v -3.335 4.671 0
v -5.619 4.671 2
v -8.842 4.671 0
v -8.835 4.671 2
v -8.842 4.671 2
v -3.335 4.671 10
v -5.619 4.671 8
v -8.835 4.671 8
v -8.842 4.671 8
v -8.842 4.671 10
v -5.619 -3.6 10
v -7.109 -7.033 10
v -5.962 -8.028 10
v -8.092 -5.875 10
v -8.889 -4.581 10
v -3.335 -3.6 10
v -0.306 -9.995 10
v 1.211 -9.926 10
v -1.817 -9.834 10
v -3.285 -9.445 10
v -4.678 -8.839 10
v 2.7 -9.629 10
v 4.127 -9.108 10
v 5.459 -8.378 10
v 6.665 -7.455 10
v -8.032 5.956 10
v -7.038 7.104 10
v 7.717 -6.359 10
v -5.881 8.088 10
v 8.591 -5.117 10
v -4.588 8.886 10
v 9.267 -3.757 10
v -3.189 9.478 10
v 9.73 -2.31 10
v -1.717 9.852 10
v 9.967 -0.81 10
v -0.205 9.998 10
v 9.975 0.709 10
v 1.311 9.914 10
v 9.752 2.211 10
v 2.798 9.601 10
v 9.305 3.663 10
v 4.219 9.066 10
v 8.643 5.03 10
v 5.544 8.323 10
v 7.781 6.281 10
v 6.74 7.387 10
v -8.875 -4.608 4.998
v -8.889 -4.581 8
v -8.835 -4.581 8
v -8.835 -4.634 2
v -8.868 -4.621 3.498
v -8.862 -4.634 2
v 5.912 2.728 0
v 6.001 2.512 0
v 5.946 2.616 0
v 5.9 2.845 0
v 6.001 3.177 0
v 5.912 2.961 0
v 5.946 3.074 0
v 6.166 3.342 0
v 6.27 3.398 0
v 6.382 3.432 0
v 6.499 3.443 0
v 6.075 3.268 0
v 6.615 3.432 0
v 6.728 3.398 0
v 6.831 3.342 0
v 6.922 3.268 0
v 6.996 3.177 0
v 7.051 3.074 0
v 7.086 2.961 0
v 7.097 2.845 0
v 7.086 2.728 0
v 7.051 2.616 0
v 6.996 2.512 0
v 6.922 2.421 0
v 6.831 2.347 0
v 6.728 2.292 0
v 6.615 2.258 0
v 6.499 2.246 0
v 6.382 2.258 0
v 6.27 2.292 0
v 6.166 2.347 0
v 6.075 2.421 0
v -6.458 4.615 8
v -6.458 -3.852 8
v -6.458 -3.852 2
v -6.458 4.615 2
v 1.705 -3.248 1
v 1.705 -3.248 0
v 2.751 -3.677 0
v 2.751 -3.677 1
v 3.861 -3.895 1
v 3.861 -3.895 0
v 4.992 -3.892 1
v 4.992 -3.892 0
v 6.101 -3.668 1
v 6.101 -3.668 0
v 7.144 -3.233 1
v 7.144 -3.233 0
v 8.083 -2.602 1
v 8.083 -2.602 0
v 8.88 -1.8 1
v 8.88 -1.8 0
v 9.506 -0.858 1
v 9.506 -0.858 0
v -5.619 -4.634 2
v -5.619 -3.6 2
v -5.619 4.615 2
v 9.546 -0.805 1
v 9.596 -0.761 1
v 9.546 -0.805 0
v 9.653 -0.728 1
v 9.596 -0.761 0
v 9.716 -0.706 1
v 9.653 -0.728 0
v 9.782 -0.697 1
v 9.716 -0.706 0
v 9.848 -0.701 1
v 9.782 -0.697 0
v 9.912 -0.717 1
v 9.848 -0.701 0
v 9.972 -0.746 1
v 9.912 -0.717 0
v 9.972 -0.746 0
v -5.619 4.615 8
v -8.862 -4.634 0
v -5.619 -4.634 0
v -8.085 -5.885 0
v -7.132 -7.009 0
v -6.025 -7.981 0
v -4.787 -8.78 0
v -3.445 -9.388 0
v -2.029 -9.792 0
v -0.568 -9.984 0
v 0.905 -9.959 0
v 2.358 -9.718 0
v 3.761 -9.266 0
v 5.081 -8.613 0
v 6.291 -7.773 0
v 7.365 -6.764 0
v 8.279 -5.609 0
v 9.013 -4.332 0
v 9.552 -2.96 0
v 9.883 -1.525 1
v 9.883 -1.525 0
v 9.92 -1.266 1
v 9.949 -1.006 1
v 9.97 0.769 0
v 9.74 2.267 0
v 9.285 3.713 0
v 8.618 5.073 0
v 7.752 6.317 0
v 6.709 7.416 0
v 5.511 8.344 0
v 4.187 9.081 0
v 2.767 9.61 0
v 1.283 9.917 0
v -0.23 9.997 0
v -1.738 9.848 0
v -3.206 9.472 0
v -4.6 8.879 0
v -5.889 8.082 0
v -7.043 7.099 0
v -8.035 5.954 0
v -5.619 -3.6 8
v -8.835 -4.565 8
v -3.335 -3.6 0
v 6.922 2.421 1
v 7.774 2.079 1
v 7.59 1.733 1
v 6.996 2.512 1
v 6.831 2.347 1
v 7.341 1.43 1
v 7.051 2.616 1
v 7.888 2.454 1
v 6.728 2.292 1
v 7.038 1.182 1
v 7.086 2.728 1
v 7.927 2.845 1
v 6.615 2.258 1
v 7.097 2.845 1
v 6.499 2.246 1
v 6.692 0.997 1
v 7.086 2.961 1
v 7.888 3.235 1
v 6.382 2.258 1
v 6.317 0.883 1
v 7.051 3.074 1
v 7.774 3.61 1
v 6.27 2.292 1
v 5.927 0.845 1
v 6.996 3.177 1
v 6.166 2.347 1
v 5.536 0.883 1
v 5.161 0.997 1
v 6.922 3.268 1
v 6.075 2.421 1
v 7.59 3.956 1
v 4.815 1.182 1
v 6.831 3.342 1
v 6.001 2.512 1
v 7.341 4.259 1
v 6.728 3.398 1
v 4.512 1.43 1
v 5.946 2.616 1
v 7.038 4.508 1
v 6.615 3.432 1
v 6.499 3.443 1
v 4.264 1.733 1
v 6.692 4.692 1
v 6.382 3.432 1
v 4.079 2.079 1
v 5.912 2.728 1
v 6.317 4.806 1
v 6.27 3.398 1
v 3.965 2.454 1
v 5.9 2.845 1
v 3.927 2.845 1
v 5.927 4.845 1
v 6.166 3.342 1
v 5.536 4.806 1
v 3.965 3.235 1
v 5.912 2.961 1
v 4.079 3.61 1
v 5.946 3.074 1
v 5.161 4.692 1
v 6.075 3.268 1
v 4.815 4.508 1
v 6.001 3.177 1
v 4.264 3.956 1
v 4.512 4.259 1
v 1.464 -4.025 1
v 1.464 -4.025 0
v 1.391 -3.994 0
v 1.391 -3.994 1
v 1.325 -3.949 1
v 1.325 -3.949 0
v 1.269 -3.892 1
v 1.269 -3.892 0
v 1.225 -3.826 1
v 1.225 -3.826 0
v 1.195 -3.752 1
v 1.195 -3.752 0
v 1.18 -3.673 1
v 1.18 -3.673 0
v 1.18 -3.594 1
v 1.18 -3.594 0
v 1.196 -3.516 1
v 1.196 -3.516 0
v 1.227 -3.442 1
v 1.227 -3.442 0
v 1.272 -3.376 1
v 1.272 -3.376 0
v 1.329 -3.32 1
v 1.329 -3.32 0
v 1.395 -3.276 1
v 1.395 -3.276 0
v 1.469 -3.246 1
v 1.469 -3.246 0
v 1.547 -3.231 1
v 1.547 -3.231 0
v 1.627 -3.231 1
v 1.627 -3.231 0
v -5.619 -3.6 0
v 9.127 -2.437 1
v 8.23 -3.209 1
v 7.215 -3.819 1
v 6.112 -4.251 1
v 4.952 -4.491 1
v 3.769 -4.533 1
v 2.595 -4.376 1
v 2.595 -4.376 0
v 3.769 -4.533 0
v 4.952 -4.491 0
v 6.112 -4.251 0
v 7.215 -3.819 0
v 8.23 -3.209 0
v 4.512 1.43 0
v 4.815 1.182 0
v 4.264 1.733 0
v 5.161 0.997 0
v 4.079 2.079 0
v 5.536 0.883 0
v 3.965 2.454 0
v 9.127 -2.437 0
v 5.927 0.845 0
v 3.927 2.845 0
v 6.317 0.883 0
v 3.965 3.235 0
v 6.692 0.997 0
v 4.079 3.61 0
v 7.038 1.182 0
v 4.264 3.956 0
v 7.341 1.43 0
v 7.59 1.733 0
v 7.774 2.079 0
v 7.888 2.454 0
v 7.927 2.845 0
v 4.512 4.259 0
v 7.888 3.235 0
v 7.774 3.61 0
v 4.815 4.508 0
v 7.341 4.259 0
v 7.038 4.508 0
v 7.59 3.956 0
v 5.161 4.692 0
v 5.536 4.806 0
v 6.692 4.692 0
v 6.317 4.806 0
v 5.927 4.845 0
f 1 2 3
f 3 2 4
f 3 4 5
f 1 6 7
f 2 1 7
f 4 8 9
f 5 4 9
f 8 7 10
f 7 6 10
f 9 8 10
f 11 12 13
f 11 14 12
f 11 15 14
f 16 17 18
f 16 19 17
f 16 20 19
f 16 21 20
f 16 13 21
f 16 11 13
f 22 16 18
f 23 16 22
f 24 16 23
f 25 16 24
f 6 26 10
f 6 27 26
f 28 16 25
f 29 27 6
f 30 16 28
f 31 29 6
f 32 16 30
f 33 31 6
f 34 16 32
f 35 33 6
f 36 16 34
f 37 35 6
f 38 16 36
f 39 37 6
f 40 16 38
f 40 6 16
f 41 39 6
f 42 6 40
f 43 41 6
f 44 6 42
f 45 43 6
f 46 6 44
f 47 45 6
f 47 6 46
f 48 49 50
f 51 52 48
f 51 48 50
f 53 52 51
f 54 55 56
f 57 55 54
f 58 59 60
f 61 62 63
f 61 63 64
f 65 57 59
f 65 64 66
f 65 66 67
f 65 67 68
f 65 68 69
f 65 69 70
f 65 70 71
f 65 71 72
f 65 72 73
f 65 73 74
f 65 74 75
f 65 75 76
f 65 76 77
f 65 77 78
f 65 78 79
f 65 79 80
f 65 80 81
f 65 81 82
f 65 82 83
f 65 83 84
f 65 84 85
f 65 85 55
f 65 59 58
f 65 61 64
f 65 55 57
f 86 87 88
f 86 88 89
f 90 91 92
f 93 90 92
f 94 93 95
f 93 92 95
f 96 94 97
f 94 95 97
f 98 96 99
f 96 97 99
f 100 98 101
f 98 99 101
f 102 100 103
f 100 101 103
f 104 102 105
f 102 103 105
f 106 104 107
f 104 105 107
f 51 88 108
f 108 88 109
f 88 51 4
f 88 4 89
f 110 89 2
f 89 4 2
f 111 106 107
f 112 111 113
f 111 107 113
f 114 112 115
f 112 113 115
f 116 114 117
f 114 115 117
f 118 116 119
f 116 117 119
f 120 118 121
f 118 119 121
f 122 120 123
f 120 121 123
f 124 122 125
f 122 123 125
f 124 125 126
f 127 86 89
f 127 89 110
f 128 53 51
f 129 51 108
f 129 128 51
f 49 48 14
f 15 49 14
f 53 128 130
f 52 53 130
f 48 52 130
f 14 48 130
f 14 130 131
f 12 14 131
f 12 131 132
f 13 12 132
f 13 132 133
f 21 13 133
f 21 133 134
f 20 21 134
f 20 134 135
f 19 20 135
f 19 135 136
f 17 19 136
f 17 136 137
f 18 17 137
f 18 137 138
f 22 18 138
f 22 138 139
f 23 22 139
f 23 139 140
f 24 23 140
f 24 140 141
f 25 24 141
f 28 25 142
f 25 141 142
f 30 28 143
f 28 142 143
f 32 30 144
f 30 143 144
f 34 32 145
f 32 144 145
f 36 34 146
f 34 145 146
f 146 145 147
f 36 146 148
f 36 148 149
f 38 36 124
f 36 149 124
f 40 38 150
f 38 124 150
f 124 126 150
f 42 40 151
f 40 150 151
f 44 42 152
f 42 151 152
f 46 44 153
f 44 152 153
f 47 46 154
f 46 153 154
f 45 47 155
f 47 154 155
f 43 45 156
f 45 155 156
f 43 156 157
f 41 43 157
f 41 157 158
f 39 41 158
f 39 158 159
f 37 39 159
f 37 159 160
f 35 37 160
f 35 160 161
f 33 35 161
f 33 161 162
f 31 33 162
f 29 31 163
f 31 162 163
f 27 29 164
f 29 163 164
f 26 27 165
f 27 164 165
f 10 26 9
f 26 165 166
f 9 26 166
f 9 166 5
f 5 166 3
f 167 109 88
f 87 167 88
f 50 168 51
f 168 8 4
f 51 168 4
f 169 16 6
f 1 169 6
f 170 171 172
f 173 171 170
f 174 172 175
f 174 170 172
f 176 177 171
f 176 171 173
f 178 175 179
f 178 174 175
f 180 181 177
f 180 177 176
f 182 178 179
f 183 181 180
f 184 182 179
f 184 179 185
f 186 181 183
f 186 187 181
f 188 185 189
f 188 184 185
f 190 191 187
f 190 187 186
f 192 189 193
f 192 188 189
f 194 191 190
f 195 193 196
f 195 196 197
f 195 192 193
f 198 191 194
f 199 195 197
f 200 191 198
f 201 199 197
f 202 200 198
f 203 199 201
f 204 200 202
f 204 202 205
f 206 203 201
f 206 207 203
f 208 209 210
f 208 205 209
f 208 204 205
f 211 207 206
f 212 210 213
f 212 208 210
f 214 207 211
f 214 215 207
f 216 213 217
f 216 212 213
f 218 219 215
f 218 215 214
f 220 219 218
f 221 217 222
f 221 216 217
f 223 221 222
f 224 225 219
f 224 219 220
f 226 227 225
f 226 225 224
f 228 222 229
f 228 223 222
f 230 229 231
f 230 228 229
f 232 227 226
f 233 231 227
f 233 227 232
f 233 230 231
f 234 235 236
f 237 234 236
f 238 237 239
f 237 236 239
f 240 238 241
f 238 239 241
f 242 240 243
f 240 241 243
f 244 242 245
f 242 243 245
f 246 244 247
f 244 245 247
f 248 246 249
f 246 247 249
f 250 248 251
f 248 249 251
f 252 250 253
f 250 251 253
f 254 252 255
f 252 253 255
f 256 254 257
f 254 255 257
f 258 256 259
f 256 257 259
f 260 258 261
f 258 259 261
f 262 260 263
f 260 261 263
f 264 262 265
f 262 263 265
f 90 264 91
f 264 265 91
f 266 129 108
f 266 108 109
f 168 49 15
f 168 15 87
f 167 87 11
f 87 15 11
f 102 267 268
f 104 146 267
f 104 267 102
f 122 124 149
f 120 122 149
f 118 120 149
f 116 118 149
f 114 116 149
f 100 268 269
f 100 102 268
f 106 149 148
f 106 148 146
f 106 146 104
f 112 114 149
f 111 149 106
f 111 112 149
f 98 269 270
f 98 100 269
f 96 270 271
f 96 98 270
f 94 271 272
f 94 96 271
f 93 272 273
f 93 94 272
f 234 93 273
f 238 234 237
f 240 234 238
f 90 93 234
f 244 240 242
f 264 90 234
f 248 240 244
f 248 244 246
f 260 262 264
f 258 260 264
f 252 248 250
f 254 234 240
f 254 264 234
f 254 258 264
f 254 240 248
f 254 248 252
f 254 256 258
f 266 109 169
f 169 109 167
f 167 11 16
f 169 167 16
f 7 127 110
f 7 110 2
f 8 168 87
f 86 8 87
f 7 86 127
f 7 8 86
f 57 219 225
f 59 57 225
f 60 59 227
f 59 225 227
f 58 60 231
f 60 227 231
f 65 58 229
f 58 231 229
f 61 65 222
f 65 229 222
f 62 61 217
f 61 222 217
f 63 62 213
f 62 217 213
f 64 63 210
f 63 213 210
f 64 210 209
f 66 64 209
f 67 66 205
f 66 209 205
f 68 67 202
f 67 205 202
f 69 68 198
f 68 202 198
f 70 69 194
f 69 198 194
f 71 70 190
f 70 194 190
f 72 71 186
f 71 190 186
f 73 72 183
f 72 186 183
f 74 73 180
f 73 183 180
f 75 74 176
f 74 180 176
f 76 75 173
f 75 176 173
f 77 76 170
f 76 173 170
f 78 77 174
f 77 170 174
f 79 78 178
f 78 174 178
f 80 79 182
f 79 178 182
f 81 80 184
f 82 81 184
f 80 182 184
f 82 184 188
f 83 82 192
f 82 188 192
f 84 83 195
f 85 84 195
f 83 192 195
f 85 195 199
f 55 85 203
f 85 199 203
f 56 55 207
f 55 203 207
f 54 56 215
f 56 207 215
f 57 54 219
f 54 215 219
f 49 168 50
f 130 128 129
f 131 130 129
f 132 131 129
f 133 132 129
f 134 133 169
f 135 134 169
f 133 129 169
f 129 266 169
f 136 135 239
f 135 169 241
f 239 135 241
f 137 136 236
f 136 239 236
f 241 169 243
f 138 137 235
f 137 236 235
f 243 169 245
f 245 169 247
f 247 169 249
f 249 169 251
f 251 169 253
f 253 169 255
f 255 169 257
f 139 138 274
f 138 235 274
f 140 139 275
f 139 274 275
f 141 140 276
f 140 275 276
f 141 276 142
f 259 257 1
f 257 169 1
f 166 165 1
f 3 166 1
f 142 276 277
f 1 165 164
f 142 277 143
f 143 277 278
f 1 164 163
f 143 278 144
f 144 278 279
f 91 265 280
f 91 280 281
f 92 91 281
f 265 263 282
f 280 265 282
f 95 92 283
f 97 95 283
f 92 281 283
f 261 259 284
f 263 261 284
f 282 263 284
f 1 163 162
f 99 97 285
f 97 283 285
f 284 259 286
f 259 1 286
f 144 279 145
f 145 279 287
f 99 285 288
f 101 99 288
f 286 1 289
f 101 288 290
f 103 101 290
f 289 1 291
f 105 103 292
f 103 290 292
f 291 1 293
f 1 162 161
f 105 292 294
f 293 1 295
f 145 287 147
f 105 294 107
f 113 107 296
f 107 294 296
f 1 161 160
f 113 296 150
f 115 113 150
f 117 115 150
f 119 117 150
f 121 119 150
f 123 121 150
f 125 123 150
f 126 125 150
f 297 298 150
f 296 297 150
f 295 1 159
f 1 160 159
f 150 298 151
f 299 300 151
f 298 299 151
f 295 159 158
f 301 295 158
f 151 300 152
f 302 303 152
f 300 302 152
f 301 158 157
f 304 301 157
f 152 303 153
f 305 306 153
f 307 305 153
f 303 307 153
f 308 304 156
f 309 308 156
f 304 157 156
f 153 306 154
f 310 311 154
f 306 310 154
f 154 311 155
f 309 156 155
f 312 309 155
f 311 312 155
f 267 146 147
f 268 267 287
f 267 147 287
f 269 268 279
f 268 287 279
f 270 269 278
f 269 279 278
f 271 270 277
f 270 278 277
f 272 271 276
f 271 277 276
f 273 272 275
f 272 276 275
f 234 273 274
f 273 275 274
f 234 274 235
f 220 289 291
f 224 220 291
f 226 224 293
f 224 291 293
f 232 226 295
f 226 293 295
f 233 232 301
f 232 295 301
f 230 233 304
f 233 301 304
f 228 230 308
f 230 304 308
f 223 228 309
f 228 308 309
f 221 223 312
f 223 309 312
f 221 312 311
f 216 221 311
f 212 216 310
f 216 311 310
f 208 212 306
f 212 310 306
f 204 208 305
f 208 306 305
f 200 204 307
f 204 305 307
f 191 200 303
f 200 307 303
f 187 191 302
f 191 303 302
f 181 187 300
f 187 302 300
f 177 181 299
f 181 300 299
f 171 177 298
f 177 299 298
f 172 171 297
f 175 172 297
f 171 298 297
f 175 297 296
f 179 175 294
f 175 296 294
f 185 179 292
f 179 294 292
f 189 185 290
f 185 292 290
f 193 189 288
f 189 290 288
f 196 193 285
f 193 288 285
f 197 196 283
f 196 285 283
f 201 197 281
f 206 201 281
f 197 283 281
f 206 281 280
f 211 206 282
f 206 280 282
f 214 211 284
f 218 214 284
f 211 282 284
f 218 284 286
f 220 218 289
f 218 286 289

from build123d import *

# Parameters (mm, degrees)
SKETCH_1_R          = 10
EXTRUDE_1_DEPTH     = 10
SKETCH_2_W          = 2.284145506
SKETCH_2_H          = 8.27120278
CUT_EXTRUDE_1_DEPTH = 10
CUT_EXTRUDE_2_DEPTH = 2
CUT_EXTRUDE_3_DEPTH = 2
CUT_EXTRUDE_4_DEPTH = 3.5
CUT_EXTRUDE_5_DEPTH = 8
SKETCH_10_R         = 2
CUT_EXTRUDE_6_DEPTH = 1
CUT_EXTRUDE_7_DEPTH = 1
SKETCH_15_R         = 0.598433569
EXTRUDE_5_DEPTH     = 1


with BuildPart() as part:
    # 草圖1 → 填料-伸長1 (new body)
    with BuildSketch(Plane.XY):
        Circle(SKETCH_1_R)
    extrude(amount=EXTRUDE_1_DEPTH)

    # 草圖2 → 除料-伸長1 (cut)
    with BuildSketch(Plane.XY.offset(10)):
        with Locations((-4.477041196, 0.535617876)):
            Rectangle(SKETCH_2_W, SKETCH_2_H)
    extrude(amount=-CUT_EXTRUDE_1_DEPTH, mode=Mode.SUBTRACT)

    # 草圖3 → 除料-伸長2 (cut)
    with BuildSketch(Plane.XY.offset(10)):
        with BuildLine():
            Line((-5.619113949, 4.671219266), (-8.84192912, 4.671219266))
            ThreePointArc((-8.84192912, 4.671219266), (-10.338729016, 0.052381637), (-8.888807861, -4.581385687))
            Line((-8.888807861, -4.581385687), (-5.619113949, -3.599983514))
            Line((-5.619113949, -3.599983514), (-5.619113949, 4.671219266))
        make_face()
    extrude(amount=-CUT_EXTRUDE_2_DEPTH, mode=Mode.SUBTRACT)

    # 草圖4 → 除料-伸長3 (cut)
    with BuildSketch(Plane(origin=(0, 0, 0), x_dir=(-1, 0, 0), z_dir=(0, 0, -1))):
        with BuildLine():
            Line((5.619113949, 4.671219266), (8.84192912, 4.671219266))
            ThreePointArc((8.84192912, 4.671219266), (10.34374886, 0.021931836), (8.86165829, -4.633682375))
            Line((8.86165829, -4.633682375), (5.619113949, -4.633682375))
            Line((5.619113949, -4.633682375), (5.619113949, 4.671219266))
        make_face()
    extrude(amount=-CUT_EXTRUDE_3_DEPTH, mode=Mode.SUBTRACT)

    # 草圖7 → 除料-伸長4 (cut)
    with BuildSketch(Plane.ZY.offset(12.334968443)):
        Polygon((2, 4.671219266), (8, 4.671219266), (8, -4.581385687), (2, -4.633682375), align=None)
    extrude(amount=-CUT_EXTRUDE_4_DEPTH, mode=Mode.SUBTRACT)

    # 草圖9 → 除料-伸長5 (cut)
    with BuildSketch(Plane.XY.offset(8)):
        Polygon((-5.619113949, 4.614635236), (-5.619113949, -3.599983514), (-6.458251574, -3.851851582), (-6.458251574, 4.614635236), align=None)
    extrude(amount=-CUT_EXTRUDE_5_DEPTH, mode=Mode.SUBTRACT)

    # 草圖10 → 除料-伸長6 (cut)
    with BuildSketch(Plane(origin=(1.147174702, 0, 0), x_dir=(-1, 0, 0), z_dir=(0, 0, -1))):
        with Locations((-4.77940273, 2.844632537)):
            Circle(SKETCH_10_R)
    extrude(amount=-CUT_EXTRUDE_6_DEPTH, mode=Mode.SUBTRACT)

    # 草圖11 → 除料-伸長7 (cut)
    with BuildSketch(Plane(origin=(3.950612042, 2.062182751, 0), x_dir=(-1, 0, 0), z_dir=(0, 0, -1))):
        with BuildLine():
            ThreePointArc((-6.134639705, -3.27946709), (-2.337132754, -6.258197714), (2.486199078, -6.08683493))
            ThreePointArc((2.486199078, -6.08683493), (2.754295623, -5.577783265), (2.245243957, -5.30968672))
            ThreePointArc((2.245243957, -5.30968672), (-2.14989891, -5.730336765), (-5.555178734, -2.919945938))
            ThreePointArc((-5.555178734, -2.919945938), (-6.024669795, -2.809976029), (-6.134639705, -3.27946709))
        make_face()
    extrude(amount=-CUT_EXTRUDE_7_DEPTH, mode=Mode.SUBTRACT)

    # 草圖15 → 填料-伸長5 (add)
    with BuildSketch(Plane(origin=(0.571990358, 0, 1), x_dir=(-1, 0, 0), z_dir=(0, 0, -1))):
        with Locations((-5.926577433, 2.844632537)):
            Circle(SKETCH_15_R)
    extrude(amount=EXTRUDE_5_DEPTH)


solid = part.part
